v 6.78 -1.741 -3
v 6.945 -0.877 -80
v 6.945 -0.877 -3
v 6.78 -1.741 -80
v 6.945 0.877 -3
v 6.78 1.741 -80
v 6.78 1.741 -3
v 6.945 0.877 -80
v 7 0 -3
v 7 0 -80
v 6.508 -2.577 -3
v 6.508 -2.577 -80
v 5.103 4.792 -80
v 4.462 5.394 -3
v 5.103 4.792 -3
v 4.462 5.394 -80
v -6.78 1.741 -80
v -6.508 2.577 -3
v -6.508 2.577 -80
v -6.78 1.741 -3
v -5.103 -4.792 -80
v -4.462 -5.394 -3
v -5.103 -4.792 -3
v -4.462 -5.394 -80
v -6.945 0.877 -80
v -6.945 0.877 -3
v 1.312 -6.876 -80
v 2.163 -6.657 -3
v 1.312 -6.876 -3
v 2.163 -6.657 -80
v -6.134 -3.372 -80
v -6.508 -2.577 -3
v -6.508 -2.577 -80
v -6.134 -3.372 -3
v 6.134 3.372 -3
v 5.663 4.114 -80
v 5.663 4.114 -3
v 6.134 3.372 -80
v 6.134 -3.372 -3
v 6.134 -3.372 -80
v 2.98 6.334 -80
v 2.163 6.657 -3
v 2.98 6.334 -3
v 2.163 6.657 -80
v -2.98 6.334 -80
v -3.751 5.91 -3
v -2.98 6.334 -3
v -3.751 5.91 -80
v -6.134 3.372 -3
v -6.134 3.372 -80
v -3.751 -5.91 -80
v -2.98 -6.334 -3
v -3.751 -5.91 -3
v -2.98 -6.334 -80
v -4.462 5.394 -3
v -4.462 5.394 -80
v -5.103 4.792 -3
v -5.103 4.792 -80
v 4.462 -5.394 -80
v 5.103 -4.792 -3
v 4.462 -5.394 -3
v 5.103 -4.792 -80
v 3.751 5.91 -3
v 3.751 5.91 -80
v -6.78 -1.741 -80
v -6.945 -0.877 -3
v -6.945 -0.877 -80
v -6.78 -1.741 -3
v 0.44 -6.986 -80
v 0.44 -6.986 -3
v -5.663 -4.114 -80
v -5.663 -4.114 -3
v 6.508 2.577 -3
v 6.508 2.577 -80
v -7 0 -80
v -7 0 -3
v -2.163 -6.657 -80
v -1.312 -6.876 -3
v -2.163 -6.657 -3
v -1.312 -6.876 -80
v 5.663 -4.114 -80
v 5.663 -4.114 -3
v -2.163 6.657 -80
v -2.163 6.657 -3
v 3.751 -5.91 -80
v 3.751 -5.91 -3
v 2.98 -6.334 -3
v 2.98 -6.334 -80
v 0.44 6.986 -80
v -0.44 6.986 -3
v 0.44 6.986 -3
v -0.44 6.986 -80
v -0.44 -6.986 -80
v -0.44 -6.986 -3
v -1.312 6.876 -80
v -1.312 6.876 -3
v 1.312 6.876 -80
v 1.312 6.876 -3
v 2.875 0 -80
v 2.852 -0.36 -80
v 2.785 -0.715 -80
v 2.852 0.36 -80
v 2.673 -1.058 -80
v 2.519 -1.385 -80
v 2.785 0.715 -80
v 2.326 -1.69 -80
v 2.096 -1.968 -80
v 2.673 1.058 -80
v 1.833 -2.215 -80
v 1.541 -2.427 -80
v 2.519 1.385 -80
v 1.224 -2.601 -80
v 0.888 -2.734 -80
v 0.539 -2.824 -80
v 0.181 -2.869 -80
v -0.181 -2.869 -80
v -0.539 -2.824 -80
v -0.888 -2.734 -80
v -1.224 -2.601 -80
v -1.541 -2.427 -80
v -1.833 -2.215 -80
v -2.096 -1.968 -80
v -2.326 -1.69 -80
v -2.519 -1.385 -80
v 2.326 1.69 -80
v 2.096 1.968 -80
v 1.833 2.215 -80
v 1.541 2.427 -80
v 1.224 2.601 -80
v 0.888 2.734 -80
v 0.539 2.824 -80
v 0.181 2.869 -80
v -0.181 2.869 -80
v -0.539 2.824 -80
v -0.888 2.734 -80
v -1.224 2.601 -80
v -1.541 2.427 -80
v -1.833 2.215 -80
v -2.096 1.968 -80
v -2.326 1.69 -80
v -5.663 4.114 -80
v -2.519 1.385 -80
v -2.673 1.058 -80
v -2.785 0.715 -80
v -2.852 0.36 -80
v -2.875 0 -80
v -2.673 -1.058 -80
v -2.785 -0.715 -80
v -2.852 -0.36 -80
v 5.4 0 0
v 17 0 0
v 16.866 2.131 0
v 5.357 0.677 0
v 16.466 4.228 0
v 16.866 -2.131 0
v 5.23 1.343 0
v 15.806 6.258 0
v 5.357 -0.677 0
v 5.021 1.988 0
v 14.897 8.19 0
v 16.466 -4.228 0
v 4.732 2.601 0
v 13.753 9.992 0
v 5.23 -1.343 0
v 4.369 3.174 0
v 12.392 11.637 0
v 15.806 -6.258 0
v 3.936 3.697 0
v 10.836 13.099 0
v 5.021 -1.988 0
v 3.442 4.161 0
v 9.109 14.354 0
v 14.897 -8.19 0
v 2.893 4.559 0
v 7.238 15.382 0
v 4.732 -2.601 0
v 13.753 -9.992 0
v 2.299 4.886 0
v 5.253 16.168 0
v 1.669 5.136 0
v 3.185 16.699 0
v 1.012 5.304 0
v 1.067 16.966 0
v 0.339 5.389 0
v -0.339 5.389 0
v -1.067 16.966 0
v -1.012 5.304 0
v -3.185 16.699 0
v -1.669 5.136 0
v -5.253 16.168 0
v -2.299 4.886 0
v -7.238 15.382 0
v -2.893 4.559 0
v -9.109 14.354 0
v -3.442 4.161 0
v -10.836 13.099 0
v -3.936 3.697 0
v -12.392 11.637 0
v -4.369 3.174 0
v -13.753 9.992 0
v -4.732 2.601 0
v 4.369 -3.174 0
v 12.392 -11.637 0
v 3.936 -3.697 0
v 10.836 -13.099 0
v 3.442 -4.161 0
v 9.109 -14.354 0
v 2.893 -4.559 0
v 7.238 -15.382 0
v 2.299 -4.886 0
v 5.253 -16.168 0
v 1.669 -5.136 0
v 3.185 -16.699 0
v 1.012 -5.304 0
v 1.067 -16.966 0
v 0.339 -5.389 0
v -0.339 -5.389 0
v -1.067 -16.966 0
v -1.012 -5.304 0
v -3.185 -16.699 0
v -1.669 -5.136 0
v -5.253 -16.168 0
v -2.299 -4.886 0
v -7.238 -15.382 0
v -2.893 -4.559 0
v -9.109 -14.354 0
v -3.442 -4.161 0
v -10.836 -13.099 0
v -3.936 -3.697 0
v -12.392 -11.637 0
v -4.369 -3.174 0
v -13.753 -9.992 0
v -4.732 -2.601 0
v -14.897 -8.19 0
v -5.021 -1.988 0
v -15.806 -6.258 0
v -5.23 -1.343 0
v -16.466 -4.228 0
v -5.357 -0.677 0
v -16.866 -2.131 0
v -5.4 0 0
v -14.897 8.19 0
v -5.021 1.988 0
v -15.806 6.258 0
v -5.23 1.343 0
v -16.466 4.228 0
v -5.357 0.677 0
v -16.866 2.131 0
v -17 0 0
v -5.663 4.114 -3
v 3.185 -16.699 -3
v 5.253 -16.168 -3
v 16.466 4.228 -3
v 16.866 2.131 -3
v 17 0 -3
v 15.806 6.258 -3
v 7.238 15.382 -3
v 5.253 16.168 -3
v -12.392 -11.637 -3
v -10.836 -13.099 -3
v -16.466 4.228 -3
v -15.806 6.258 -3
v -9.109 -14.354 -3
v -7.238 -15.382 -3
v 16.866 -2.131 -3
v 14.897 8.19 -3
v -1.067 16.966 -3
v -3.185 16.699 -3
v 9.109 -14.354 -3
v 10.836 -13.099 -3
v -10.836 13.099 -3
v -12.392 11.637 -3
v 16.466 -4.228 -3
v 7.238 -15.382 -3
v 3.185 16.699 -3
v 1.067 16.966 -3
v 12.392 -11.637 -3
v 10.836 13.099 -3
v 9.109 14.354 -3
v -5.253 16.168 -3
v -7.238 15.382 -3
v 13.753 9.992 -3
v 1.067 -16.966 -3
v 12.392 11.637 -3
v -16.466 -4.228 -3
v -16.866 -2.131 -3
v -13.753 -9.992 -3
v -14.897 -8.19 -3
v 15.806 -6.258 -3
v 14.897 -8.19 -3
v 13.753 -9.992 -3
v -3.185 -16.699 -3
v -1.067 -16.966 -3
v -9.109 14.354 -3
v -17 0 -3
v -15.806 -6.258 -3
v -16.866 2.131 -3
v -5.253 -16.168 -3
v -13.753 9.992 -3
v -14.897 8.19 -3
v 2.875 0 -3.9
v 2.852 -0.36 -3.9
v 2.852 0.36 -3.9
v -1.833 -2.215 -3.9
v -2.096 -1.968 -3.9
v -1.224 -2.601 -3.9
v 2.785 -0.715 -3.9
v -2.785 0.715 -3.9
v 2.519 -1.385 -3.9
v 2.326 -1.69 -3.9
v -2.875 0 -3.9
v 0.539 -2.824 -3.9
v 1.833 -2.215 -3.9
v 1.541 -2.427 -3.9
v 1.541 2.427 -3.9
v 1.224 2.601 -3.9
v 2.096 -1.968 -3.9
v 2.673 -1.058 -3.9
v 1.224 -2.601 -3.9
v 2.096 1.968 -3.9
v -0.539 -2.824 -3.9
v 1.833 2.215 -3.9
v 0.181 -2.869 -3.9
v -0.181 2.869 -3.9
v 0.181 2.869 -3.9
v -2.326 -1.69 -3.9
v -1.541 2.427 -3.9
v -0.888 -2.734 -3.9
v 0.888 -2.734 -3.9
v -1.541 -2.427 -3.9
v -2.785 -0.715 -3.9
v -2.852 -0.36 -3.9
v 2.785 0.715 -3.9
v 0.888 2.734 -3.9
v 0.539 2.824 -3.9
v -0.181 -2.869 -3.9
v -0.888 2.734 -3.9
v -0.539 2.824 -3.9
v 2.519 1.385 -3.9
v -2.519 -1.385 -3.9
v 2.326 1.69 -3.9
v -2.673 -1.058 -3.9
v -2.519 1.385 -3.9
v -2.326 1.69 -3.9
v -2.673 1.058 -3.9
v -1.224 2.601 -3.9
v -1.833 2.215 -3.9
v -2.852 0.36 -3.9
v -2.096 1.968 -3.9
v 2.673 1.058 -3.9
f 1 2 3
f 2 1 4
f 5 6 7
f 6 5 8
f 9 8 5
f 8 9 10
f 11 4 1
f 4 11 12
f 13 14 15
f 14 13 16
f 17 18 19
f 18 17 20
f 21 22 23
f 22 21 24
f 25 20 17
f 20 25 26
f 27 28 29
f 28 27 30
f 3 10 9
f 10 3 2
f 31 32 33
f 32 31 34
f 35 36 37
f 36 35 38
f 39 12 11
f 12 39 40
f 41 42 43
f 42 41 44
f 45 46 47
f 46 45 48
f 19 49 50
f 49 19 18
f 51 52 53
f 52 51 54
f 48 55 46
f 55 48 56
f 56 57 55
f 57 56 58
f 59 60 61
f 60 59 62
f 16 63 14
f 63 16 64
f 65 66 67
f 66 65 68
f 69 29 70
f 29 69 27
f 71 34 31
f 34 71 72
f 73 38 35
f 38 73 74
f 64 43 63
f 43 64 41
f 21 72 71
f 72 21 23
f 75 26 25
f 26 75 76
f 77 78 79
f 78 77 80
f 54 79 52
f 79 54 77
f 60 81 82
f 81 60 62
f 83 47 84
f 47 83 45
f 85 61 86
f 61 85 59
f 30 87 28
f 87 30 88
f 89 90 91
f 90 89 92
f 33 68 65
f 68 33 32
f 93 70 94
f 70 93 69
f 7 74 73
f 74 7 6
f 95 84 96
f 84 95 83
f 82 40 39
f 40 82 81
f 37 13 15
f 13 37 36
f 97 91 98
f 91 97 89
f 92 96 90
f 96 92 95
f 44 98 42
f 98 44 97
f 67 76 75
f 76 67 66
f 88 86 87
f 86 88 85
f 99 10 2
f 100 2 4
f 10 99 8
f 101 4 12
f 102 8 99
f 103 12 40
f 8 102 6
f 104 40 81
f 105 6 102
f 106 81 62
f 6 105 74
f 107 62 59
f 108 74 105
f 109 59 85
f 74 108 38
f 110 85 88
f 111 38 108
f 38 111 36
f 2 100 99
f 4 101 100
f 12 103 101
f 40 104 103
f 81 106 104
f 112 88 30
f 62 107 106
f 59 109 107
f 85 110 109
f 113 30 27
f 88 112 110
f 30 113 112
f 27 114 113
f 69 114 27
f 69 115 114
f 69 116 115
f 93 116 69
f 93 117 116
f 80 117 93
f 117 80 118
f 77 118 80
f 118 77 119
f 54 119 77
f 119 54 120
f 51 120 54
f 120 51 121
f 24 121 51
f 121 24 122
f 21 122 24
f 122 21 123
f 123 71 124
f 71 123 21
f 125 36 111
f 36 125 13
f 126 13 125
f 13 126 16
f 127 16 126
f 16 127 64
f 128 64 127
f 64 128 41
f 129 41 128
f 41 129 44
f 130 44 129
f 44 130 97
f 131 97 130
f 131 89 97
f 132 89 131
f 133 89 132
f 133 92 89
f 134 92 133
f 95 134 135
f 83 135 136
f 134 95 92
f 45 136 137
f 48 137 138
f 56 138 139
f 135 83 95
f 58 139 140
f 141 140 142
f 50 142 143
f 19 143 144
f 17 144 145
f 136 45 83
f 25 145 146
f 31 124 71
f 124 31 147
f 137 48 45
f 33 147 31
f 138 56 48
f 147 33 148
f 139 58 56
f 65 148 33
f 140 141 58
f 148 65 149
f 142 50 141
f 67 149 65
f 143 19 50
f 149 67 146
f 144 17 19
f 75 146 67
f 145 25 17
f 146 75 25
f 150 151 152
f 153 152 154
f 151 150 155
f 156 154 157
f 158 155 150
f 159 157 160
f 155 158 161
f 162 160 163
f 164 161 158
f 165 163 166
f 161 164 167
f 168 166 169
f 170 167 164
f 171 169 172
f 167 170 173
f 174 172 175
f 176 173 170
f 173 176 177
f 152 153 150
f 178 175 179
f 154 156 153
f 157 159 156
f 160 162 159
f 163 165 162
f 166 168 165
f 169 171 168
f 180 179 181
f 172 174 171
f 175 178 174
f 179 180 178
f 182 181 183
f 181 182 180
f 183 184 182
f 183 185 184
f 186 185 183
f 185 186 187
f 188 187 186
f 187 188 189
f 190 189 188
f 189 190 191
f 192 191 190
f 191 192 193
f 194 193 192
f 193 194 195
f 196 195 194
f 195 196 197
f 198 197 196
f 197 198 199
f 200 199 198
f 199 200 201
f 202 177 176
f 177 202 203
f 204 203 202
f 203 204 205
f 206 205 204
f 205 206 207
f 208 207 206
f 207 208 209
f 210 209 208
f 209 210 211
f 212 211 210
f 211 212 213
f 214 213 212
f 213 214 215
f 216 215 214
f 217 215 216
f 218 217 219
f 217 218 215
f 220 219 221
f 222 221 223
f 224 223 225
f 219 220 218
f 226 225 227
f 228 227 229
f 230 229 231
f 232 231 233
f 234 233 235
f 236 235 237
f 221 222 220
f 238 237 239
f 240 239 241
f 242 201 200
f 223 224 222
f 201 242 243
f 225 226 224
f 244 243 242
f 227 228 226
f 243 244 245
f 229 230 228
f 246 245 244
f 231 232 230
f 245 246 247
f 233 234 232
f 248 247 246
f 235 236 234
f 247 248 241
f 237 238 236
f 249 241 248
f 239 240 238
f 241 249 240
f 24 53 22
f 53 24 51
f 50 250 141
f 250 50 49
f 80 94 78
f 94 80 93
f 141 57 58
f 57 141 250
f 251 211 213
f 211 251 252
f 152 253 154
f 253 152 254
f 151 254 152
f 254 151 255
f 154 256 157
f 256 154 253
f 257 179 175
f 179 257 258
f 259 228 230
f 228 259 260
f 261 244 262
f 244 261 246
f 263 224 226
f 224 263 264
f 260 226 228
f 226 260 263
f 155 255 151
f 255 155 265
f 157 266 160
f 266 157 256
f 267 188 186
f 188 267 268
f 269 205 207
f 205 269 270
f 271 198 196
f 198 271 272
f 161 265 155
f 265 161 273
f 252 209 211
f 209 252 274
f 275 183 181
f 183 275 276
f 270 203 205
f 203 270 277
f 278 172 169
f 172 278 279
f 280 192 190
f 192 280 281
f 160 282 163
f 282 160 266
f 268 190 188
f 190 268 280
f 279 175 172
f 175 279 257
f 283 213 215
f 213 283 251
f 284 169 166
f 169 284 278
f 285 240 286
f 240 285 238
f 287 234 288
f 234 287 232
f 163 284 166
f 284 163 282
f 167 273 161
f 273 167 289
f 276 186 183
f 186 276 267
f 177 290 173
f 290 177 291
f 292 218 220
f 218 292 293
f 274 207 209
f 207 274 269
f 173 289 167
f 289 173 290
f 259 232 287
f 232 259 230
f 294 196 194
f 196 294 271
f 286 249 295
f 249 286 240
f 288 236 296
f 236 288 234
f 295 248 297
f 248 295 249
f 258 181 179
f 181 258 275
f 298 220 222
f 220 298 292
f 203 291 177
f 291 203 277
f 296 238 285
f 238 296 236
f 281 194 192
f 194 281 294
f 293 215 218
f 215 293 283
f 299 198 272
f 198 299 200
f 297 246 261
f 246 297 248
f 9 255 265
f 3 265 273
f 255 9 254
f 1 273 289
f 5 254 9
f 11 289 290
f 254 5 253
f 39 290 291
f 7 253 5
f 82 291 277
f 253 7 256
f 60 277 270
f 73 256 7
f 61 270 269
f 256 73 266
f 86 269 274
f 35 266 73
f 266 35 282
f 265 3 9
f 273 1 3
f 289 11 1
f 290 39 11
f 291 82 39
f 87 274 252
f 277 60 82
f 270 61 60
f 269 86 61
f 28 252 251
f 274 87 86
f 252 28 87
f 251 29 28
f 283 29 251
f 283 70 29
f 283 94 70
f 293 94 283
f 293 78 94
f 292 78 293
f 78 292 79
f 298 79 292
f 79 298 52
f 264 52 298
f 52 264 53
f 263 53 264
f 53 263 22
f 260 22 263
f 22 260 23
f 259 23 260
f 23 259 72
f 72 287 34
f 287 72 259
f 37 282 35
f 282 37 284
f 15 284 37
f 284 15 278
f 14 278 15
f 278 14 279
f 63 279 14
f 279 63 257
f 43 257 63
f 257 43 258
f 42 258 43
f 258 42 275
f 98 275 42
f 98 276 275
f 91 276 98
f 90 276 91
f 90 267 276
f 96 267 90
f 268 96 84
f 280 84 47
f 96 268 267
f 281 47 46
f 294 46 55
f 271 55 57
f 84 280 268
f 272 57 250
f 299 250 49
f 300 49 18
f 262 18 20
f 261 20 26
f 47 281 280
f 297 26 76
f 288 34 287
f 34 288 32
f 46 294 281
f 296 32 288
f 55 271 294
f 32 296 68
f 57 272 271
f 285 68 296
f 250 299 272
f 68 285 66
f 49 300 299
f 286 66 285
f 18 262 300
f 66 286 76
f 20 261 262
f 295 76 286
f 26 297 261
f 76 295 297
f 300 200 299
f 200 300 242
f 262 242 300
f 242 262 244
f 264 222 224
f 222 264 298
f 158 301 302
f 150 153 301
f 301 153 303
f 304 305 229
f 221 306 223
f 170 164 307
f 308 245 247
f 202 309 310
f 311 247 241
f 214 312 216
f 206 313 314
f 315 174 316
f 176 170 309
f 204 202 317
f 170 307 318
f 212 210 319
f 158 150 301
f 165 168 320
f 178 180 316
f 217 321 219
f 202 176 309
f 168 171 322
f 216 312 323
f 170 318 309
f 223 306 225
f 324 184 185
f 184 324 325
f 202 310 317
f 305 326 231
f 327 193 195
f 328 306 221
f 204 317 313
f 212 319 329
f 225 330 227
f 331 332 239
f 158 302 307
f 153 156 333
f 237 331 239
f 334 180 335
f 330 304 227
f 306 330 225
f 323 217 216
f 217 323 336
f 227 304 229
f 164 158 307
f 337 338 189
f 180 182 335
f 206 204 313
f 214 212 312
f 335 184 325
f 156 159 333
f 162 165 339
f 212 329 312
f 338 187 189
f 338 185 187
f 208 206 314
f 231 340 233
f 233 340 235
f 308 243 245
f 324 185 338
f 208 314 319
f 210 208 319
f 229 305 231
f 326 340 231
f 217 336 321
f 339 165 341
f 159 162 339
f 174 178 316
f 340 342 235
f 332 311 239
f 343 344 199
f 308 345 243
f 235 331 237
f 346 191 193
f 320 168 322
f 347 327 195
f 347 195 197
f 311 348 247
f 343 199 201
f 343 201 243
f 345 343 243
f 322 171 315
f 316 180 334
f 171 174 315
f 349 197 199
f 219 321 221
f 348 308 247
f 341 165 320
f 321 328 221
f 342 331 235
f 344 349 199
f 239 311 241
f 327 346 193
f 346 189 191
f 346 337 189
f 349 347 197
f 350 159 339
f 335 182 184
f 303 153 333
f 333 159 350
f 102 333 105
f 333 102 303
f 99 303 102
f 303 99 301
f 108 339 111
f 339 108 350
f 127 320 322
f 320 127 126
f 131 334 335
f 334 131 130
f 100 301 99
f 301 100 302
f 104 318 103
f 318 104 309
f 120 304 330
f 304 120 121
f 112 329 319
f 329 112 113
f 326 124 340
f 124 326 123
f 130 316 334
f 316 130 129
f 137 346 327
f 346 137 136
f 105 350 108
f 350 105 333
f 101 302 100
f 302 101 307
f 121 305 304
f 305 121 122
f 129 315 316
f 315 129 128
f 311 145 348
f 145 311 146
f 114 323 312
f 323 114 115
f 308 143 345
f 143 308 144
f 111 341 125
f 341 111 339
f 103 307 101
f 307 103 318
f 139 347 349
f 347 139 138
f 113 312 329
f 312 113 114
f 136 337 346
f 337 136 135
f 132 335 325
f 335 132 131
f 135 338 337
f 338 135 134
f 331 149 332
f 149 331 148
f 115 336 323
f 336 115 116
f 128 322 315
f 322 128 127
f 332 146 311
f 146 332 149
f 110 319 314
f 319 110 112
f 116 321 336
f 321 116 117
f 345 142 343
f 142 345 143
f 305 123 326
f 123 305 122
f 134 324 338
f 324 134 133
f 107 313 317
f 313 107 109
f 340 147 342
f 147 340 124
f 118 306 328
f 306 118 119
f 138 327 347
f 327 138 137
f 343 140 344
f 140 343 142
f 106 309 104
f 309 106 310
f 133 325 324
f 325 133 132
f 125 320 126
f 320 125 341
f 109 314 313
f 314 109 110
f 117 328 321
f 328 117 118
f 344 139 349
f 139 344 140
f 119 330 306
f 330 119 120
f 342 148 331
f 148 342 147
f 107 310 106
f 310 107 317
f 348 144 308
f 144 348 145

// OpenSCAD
$fn = 50;


difference() {
	union() {
		translate(v = [0, 0, -80.0000000000]) {
			cylinder(h = 80, r = 7.0000000000);
		}
		translate(v = [0, 0, -3.0000000000]) {
			cylinder(h = 3, r = 17.0000000000);
		}
	}
	union() {
		translate(v = [0, 0, 0]) {
			rotate(a = [0, 0, 0]) {
				difference() {
					union() {
						#translate(v = [0, 0, -80.0000000000]) {
							cylinder(h = 80, r = 2.6000000000);
						}
						#translate(v = [0, 0, -3.9000000000]) {
							cylinder(h = 3.9000000000, r = 7.0000000000, r1 = 2.8750000000, r2 = 5.4000000000);
						}
						#translate(v = [0, 0, -80.0000000000]) {
							cylinder(h = 80, r = 2.8750000000);
						}
						#translate(v = [0, 0, -80.0000000000]) {
							cylinder(h = 80, r = 2.6000000000);
						}
					}
					union();
				}
			}
		}
	}
}
